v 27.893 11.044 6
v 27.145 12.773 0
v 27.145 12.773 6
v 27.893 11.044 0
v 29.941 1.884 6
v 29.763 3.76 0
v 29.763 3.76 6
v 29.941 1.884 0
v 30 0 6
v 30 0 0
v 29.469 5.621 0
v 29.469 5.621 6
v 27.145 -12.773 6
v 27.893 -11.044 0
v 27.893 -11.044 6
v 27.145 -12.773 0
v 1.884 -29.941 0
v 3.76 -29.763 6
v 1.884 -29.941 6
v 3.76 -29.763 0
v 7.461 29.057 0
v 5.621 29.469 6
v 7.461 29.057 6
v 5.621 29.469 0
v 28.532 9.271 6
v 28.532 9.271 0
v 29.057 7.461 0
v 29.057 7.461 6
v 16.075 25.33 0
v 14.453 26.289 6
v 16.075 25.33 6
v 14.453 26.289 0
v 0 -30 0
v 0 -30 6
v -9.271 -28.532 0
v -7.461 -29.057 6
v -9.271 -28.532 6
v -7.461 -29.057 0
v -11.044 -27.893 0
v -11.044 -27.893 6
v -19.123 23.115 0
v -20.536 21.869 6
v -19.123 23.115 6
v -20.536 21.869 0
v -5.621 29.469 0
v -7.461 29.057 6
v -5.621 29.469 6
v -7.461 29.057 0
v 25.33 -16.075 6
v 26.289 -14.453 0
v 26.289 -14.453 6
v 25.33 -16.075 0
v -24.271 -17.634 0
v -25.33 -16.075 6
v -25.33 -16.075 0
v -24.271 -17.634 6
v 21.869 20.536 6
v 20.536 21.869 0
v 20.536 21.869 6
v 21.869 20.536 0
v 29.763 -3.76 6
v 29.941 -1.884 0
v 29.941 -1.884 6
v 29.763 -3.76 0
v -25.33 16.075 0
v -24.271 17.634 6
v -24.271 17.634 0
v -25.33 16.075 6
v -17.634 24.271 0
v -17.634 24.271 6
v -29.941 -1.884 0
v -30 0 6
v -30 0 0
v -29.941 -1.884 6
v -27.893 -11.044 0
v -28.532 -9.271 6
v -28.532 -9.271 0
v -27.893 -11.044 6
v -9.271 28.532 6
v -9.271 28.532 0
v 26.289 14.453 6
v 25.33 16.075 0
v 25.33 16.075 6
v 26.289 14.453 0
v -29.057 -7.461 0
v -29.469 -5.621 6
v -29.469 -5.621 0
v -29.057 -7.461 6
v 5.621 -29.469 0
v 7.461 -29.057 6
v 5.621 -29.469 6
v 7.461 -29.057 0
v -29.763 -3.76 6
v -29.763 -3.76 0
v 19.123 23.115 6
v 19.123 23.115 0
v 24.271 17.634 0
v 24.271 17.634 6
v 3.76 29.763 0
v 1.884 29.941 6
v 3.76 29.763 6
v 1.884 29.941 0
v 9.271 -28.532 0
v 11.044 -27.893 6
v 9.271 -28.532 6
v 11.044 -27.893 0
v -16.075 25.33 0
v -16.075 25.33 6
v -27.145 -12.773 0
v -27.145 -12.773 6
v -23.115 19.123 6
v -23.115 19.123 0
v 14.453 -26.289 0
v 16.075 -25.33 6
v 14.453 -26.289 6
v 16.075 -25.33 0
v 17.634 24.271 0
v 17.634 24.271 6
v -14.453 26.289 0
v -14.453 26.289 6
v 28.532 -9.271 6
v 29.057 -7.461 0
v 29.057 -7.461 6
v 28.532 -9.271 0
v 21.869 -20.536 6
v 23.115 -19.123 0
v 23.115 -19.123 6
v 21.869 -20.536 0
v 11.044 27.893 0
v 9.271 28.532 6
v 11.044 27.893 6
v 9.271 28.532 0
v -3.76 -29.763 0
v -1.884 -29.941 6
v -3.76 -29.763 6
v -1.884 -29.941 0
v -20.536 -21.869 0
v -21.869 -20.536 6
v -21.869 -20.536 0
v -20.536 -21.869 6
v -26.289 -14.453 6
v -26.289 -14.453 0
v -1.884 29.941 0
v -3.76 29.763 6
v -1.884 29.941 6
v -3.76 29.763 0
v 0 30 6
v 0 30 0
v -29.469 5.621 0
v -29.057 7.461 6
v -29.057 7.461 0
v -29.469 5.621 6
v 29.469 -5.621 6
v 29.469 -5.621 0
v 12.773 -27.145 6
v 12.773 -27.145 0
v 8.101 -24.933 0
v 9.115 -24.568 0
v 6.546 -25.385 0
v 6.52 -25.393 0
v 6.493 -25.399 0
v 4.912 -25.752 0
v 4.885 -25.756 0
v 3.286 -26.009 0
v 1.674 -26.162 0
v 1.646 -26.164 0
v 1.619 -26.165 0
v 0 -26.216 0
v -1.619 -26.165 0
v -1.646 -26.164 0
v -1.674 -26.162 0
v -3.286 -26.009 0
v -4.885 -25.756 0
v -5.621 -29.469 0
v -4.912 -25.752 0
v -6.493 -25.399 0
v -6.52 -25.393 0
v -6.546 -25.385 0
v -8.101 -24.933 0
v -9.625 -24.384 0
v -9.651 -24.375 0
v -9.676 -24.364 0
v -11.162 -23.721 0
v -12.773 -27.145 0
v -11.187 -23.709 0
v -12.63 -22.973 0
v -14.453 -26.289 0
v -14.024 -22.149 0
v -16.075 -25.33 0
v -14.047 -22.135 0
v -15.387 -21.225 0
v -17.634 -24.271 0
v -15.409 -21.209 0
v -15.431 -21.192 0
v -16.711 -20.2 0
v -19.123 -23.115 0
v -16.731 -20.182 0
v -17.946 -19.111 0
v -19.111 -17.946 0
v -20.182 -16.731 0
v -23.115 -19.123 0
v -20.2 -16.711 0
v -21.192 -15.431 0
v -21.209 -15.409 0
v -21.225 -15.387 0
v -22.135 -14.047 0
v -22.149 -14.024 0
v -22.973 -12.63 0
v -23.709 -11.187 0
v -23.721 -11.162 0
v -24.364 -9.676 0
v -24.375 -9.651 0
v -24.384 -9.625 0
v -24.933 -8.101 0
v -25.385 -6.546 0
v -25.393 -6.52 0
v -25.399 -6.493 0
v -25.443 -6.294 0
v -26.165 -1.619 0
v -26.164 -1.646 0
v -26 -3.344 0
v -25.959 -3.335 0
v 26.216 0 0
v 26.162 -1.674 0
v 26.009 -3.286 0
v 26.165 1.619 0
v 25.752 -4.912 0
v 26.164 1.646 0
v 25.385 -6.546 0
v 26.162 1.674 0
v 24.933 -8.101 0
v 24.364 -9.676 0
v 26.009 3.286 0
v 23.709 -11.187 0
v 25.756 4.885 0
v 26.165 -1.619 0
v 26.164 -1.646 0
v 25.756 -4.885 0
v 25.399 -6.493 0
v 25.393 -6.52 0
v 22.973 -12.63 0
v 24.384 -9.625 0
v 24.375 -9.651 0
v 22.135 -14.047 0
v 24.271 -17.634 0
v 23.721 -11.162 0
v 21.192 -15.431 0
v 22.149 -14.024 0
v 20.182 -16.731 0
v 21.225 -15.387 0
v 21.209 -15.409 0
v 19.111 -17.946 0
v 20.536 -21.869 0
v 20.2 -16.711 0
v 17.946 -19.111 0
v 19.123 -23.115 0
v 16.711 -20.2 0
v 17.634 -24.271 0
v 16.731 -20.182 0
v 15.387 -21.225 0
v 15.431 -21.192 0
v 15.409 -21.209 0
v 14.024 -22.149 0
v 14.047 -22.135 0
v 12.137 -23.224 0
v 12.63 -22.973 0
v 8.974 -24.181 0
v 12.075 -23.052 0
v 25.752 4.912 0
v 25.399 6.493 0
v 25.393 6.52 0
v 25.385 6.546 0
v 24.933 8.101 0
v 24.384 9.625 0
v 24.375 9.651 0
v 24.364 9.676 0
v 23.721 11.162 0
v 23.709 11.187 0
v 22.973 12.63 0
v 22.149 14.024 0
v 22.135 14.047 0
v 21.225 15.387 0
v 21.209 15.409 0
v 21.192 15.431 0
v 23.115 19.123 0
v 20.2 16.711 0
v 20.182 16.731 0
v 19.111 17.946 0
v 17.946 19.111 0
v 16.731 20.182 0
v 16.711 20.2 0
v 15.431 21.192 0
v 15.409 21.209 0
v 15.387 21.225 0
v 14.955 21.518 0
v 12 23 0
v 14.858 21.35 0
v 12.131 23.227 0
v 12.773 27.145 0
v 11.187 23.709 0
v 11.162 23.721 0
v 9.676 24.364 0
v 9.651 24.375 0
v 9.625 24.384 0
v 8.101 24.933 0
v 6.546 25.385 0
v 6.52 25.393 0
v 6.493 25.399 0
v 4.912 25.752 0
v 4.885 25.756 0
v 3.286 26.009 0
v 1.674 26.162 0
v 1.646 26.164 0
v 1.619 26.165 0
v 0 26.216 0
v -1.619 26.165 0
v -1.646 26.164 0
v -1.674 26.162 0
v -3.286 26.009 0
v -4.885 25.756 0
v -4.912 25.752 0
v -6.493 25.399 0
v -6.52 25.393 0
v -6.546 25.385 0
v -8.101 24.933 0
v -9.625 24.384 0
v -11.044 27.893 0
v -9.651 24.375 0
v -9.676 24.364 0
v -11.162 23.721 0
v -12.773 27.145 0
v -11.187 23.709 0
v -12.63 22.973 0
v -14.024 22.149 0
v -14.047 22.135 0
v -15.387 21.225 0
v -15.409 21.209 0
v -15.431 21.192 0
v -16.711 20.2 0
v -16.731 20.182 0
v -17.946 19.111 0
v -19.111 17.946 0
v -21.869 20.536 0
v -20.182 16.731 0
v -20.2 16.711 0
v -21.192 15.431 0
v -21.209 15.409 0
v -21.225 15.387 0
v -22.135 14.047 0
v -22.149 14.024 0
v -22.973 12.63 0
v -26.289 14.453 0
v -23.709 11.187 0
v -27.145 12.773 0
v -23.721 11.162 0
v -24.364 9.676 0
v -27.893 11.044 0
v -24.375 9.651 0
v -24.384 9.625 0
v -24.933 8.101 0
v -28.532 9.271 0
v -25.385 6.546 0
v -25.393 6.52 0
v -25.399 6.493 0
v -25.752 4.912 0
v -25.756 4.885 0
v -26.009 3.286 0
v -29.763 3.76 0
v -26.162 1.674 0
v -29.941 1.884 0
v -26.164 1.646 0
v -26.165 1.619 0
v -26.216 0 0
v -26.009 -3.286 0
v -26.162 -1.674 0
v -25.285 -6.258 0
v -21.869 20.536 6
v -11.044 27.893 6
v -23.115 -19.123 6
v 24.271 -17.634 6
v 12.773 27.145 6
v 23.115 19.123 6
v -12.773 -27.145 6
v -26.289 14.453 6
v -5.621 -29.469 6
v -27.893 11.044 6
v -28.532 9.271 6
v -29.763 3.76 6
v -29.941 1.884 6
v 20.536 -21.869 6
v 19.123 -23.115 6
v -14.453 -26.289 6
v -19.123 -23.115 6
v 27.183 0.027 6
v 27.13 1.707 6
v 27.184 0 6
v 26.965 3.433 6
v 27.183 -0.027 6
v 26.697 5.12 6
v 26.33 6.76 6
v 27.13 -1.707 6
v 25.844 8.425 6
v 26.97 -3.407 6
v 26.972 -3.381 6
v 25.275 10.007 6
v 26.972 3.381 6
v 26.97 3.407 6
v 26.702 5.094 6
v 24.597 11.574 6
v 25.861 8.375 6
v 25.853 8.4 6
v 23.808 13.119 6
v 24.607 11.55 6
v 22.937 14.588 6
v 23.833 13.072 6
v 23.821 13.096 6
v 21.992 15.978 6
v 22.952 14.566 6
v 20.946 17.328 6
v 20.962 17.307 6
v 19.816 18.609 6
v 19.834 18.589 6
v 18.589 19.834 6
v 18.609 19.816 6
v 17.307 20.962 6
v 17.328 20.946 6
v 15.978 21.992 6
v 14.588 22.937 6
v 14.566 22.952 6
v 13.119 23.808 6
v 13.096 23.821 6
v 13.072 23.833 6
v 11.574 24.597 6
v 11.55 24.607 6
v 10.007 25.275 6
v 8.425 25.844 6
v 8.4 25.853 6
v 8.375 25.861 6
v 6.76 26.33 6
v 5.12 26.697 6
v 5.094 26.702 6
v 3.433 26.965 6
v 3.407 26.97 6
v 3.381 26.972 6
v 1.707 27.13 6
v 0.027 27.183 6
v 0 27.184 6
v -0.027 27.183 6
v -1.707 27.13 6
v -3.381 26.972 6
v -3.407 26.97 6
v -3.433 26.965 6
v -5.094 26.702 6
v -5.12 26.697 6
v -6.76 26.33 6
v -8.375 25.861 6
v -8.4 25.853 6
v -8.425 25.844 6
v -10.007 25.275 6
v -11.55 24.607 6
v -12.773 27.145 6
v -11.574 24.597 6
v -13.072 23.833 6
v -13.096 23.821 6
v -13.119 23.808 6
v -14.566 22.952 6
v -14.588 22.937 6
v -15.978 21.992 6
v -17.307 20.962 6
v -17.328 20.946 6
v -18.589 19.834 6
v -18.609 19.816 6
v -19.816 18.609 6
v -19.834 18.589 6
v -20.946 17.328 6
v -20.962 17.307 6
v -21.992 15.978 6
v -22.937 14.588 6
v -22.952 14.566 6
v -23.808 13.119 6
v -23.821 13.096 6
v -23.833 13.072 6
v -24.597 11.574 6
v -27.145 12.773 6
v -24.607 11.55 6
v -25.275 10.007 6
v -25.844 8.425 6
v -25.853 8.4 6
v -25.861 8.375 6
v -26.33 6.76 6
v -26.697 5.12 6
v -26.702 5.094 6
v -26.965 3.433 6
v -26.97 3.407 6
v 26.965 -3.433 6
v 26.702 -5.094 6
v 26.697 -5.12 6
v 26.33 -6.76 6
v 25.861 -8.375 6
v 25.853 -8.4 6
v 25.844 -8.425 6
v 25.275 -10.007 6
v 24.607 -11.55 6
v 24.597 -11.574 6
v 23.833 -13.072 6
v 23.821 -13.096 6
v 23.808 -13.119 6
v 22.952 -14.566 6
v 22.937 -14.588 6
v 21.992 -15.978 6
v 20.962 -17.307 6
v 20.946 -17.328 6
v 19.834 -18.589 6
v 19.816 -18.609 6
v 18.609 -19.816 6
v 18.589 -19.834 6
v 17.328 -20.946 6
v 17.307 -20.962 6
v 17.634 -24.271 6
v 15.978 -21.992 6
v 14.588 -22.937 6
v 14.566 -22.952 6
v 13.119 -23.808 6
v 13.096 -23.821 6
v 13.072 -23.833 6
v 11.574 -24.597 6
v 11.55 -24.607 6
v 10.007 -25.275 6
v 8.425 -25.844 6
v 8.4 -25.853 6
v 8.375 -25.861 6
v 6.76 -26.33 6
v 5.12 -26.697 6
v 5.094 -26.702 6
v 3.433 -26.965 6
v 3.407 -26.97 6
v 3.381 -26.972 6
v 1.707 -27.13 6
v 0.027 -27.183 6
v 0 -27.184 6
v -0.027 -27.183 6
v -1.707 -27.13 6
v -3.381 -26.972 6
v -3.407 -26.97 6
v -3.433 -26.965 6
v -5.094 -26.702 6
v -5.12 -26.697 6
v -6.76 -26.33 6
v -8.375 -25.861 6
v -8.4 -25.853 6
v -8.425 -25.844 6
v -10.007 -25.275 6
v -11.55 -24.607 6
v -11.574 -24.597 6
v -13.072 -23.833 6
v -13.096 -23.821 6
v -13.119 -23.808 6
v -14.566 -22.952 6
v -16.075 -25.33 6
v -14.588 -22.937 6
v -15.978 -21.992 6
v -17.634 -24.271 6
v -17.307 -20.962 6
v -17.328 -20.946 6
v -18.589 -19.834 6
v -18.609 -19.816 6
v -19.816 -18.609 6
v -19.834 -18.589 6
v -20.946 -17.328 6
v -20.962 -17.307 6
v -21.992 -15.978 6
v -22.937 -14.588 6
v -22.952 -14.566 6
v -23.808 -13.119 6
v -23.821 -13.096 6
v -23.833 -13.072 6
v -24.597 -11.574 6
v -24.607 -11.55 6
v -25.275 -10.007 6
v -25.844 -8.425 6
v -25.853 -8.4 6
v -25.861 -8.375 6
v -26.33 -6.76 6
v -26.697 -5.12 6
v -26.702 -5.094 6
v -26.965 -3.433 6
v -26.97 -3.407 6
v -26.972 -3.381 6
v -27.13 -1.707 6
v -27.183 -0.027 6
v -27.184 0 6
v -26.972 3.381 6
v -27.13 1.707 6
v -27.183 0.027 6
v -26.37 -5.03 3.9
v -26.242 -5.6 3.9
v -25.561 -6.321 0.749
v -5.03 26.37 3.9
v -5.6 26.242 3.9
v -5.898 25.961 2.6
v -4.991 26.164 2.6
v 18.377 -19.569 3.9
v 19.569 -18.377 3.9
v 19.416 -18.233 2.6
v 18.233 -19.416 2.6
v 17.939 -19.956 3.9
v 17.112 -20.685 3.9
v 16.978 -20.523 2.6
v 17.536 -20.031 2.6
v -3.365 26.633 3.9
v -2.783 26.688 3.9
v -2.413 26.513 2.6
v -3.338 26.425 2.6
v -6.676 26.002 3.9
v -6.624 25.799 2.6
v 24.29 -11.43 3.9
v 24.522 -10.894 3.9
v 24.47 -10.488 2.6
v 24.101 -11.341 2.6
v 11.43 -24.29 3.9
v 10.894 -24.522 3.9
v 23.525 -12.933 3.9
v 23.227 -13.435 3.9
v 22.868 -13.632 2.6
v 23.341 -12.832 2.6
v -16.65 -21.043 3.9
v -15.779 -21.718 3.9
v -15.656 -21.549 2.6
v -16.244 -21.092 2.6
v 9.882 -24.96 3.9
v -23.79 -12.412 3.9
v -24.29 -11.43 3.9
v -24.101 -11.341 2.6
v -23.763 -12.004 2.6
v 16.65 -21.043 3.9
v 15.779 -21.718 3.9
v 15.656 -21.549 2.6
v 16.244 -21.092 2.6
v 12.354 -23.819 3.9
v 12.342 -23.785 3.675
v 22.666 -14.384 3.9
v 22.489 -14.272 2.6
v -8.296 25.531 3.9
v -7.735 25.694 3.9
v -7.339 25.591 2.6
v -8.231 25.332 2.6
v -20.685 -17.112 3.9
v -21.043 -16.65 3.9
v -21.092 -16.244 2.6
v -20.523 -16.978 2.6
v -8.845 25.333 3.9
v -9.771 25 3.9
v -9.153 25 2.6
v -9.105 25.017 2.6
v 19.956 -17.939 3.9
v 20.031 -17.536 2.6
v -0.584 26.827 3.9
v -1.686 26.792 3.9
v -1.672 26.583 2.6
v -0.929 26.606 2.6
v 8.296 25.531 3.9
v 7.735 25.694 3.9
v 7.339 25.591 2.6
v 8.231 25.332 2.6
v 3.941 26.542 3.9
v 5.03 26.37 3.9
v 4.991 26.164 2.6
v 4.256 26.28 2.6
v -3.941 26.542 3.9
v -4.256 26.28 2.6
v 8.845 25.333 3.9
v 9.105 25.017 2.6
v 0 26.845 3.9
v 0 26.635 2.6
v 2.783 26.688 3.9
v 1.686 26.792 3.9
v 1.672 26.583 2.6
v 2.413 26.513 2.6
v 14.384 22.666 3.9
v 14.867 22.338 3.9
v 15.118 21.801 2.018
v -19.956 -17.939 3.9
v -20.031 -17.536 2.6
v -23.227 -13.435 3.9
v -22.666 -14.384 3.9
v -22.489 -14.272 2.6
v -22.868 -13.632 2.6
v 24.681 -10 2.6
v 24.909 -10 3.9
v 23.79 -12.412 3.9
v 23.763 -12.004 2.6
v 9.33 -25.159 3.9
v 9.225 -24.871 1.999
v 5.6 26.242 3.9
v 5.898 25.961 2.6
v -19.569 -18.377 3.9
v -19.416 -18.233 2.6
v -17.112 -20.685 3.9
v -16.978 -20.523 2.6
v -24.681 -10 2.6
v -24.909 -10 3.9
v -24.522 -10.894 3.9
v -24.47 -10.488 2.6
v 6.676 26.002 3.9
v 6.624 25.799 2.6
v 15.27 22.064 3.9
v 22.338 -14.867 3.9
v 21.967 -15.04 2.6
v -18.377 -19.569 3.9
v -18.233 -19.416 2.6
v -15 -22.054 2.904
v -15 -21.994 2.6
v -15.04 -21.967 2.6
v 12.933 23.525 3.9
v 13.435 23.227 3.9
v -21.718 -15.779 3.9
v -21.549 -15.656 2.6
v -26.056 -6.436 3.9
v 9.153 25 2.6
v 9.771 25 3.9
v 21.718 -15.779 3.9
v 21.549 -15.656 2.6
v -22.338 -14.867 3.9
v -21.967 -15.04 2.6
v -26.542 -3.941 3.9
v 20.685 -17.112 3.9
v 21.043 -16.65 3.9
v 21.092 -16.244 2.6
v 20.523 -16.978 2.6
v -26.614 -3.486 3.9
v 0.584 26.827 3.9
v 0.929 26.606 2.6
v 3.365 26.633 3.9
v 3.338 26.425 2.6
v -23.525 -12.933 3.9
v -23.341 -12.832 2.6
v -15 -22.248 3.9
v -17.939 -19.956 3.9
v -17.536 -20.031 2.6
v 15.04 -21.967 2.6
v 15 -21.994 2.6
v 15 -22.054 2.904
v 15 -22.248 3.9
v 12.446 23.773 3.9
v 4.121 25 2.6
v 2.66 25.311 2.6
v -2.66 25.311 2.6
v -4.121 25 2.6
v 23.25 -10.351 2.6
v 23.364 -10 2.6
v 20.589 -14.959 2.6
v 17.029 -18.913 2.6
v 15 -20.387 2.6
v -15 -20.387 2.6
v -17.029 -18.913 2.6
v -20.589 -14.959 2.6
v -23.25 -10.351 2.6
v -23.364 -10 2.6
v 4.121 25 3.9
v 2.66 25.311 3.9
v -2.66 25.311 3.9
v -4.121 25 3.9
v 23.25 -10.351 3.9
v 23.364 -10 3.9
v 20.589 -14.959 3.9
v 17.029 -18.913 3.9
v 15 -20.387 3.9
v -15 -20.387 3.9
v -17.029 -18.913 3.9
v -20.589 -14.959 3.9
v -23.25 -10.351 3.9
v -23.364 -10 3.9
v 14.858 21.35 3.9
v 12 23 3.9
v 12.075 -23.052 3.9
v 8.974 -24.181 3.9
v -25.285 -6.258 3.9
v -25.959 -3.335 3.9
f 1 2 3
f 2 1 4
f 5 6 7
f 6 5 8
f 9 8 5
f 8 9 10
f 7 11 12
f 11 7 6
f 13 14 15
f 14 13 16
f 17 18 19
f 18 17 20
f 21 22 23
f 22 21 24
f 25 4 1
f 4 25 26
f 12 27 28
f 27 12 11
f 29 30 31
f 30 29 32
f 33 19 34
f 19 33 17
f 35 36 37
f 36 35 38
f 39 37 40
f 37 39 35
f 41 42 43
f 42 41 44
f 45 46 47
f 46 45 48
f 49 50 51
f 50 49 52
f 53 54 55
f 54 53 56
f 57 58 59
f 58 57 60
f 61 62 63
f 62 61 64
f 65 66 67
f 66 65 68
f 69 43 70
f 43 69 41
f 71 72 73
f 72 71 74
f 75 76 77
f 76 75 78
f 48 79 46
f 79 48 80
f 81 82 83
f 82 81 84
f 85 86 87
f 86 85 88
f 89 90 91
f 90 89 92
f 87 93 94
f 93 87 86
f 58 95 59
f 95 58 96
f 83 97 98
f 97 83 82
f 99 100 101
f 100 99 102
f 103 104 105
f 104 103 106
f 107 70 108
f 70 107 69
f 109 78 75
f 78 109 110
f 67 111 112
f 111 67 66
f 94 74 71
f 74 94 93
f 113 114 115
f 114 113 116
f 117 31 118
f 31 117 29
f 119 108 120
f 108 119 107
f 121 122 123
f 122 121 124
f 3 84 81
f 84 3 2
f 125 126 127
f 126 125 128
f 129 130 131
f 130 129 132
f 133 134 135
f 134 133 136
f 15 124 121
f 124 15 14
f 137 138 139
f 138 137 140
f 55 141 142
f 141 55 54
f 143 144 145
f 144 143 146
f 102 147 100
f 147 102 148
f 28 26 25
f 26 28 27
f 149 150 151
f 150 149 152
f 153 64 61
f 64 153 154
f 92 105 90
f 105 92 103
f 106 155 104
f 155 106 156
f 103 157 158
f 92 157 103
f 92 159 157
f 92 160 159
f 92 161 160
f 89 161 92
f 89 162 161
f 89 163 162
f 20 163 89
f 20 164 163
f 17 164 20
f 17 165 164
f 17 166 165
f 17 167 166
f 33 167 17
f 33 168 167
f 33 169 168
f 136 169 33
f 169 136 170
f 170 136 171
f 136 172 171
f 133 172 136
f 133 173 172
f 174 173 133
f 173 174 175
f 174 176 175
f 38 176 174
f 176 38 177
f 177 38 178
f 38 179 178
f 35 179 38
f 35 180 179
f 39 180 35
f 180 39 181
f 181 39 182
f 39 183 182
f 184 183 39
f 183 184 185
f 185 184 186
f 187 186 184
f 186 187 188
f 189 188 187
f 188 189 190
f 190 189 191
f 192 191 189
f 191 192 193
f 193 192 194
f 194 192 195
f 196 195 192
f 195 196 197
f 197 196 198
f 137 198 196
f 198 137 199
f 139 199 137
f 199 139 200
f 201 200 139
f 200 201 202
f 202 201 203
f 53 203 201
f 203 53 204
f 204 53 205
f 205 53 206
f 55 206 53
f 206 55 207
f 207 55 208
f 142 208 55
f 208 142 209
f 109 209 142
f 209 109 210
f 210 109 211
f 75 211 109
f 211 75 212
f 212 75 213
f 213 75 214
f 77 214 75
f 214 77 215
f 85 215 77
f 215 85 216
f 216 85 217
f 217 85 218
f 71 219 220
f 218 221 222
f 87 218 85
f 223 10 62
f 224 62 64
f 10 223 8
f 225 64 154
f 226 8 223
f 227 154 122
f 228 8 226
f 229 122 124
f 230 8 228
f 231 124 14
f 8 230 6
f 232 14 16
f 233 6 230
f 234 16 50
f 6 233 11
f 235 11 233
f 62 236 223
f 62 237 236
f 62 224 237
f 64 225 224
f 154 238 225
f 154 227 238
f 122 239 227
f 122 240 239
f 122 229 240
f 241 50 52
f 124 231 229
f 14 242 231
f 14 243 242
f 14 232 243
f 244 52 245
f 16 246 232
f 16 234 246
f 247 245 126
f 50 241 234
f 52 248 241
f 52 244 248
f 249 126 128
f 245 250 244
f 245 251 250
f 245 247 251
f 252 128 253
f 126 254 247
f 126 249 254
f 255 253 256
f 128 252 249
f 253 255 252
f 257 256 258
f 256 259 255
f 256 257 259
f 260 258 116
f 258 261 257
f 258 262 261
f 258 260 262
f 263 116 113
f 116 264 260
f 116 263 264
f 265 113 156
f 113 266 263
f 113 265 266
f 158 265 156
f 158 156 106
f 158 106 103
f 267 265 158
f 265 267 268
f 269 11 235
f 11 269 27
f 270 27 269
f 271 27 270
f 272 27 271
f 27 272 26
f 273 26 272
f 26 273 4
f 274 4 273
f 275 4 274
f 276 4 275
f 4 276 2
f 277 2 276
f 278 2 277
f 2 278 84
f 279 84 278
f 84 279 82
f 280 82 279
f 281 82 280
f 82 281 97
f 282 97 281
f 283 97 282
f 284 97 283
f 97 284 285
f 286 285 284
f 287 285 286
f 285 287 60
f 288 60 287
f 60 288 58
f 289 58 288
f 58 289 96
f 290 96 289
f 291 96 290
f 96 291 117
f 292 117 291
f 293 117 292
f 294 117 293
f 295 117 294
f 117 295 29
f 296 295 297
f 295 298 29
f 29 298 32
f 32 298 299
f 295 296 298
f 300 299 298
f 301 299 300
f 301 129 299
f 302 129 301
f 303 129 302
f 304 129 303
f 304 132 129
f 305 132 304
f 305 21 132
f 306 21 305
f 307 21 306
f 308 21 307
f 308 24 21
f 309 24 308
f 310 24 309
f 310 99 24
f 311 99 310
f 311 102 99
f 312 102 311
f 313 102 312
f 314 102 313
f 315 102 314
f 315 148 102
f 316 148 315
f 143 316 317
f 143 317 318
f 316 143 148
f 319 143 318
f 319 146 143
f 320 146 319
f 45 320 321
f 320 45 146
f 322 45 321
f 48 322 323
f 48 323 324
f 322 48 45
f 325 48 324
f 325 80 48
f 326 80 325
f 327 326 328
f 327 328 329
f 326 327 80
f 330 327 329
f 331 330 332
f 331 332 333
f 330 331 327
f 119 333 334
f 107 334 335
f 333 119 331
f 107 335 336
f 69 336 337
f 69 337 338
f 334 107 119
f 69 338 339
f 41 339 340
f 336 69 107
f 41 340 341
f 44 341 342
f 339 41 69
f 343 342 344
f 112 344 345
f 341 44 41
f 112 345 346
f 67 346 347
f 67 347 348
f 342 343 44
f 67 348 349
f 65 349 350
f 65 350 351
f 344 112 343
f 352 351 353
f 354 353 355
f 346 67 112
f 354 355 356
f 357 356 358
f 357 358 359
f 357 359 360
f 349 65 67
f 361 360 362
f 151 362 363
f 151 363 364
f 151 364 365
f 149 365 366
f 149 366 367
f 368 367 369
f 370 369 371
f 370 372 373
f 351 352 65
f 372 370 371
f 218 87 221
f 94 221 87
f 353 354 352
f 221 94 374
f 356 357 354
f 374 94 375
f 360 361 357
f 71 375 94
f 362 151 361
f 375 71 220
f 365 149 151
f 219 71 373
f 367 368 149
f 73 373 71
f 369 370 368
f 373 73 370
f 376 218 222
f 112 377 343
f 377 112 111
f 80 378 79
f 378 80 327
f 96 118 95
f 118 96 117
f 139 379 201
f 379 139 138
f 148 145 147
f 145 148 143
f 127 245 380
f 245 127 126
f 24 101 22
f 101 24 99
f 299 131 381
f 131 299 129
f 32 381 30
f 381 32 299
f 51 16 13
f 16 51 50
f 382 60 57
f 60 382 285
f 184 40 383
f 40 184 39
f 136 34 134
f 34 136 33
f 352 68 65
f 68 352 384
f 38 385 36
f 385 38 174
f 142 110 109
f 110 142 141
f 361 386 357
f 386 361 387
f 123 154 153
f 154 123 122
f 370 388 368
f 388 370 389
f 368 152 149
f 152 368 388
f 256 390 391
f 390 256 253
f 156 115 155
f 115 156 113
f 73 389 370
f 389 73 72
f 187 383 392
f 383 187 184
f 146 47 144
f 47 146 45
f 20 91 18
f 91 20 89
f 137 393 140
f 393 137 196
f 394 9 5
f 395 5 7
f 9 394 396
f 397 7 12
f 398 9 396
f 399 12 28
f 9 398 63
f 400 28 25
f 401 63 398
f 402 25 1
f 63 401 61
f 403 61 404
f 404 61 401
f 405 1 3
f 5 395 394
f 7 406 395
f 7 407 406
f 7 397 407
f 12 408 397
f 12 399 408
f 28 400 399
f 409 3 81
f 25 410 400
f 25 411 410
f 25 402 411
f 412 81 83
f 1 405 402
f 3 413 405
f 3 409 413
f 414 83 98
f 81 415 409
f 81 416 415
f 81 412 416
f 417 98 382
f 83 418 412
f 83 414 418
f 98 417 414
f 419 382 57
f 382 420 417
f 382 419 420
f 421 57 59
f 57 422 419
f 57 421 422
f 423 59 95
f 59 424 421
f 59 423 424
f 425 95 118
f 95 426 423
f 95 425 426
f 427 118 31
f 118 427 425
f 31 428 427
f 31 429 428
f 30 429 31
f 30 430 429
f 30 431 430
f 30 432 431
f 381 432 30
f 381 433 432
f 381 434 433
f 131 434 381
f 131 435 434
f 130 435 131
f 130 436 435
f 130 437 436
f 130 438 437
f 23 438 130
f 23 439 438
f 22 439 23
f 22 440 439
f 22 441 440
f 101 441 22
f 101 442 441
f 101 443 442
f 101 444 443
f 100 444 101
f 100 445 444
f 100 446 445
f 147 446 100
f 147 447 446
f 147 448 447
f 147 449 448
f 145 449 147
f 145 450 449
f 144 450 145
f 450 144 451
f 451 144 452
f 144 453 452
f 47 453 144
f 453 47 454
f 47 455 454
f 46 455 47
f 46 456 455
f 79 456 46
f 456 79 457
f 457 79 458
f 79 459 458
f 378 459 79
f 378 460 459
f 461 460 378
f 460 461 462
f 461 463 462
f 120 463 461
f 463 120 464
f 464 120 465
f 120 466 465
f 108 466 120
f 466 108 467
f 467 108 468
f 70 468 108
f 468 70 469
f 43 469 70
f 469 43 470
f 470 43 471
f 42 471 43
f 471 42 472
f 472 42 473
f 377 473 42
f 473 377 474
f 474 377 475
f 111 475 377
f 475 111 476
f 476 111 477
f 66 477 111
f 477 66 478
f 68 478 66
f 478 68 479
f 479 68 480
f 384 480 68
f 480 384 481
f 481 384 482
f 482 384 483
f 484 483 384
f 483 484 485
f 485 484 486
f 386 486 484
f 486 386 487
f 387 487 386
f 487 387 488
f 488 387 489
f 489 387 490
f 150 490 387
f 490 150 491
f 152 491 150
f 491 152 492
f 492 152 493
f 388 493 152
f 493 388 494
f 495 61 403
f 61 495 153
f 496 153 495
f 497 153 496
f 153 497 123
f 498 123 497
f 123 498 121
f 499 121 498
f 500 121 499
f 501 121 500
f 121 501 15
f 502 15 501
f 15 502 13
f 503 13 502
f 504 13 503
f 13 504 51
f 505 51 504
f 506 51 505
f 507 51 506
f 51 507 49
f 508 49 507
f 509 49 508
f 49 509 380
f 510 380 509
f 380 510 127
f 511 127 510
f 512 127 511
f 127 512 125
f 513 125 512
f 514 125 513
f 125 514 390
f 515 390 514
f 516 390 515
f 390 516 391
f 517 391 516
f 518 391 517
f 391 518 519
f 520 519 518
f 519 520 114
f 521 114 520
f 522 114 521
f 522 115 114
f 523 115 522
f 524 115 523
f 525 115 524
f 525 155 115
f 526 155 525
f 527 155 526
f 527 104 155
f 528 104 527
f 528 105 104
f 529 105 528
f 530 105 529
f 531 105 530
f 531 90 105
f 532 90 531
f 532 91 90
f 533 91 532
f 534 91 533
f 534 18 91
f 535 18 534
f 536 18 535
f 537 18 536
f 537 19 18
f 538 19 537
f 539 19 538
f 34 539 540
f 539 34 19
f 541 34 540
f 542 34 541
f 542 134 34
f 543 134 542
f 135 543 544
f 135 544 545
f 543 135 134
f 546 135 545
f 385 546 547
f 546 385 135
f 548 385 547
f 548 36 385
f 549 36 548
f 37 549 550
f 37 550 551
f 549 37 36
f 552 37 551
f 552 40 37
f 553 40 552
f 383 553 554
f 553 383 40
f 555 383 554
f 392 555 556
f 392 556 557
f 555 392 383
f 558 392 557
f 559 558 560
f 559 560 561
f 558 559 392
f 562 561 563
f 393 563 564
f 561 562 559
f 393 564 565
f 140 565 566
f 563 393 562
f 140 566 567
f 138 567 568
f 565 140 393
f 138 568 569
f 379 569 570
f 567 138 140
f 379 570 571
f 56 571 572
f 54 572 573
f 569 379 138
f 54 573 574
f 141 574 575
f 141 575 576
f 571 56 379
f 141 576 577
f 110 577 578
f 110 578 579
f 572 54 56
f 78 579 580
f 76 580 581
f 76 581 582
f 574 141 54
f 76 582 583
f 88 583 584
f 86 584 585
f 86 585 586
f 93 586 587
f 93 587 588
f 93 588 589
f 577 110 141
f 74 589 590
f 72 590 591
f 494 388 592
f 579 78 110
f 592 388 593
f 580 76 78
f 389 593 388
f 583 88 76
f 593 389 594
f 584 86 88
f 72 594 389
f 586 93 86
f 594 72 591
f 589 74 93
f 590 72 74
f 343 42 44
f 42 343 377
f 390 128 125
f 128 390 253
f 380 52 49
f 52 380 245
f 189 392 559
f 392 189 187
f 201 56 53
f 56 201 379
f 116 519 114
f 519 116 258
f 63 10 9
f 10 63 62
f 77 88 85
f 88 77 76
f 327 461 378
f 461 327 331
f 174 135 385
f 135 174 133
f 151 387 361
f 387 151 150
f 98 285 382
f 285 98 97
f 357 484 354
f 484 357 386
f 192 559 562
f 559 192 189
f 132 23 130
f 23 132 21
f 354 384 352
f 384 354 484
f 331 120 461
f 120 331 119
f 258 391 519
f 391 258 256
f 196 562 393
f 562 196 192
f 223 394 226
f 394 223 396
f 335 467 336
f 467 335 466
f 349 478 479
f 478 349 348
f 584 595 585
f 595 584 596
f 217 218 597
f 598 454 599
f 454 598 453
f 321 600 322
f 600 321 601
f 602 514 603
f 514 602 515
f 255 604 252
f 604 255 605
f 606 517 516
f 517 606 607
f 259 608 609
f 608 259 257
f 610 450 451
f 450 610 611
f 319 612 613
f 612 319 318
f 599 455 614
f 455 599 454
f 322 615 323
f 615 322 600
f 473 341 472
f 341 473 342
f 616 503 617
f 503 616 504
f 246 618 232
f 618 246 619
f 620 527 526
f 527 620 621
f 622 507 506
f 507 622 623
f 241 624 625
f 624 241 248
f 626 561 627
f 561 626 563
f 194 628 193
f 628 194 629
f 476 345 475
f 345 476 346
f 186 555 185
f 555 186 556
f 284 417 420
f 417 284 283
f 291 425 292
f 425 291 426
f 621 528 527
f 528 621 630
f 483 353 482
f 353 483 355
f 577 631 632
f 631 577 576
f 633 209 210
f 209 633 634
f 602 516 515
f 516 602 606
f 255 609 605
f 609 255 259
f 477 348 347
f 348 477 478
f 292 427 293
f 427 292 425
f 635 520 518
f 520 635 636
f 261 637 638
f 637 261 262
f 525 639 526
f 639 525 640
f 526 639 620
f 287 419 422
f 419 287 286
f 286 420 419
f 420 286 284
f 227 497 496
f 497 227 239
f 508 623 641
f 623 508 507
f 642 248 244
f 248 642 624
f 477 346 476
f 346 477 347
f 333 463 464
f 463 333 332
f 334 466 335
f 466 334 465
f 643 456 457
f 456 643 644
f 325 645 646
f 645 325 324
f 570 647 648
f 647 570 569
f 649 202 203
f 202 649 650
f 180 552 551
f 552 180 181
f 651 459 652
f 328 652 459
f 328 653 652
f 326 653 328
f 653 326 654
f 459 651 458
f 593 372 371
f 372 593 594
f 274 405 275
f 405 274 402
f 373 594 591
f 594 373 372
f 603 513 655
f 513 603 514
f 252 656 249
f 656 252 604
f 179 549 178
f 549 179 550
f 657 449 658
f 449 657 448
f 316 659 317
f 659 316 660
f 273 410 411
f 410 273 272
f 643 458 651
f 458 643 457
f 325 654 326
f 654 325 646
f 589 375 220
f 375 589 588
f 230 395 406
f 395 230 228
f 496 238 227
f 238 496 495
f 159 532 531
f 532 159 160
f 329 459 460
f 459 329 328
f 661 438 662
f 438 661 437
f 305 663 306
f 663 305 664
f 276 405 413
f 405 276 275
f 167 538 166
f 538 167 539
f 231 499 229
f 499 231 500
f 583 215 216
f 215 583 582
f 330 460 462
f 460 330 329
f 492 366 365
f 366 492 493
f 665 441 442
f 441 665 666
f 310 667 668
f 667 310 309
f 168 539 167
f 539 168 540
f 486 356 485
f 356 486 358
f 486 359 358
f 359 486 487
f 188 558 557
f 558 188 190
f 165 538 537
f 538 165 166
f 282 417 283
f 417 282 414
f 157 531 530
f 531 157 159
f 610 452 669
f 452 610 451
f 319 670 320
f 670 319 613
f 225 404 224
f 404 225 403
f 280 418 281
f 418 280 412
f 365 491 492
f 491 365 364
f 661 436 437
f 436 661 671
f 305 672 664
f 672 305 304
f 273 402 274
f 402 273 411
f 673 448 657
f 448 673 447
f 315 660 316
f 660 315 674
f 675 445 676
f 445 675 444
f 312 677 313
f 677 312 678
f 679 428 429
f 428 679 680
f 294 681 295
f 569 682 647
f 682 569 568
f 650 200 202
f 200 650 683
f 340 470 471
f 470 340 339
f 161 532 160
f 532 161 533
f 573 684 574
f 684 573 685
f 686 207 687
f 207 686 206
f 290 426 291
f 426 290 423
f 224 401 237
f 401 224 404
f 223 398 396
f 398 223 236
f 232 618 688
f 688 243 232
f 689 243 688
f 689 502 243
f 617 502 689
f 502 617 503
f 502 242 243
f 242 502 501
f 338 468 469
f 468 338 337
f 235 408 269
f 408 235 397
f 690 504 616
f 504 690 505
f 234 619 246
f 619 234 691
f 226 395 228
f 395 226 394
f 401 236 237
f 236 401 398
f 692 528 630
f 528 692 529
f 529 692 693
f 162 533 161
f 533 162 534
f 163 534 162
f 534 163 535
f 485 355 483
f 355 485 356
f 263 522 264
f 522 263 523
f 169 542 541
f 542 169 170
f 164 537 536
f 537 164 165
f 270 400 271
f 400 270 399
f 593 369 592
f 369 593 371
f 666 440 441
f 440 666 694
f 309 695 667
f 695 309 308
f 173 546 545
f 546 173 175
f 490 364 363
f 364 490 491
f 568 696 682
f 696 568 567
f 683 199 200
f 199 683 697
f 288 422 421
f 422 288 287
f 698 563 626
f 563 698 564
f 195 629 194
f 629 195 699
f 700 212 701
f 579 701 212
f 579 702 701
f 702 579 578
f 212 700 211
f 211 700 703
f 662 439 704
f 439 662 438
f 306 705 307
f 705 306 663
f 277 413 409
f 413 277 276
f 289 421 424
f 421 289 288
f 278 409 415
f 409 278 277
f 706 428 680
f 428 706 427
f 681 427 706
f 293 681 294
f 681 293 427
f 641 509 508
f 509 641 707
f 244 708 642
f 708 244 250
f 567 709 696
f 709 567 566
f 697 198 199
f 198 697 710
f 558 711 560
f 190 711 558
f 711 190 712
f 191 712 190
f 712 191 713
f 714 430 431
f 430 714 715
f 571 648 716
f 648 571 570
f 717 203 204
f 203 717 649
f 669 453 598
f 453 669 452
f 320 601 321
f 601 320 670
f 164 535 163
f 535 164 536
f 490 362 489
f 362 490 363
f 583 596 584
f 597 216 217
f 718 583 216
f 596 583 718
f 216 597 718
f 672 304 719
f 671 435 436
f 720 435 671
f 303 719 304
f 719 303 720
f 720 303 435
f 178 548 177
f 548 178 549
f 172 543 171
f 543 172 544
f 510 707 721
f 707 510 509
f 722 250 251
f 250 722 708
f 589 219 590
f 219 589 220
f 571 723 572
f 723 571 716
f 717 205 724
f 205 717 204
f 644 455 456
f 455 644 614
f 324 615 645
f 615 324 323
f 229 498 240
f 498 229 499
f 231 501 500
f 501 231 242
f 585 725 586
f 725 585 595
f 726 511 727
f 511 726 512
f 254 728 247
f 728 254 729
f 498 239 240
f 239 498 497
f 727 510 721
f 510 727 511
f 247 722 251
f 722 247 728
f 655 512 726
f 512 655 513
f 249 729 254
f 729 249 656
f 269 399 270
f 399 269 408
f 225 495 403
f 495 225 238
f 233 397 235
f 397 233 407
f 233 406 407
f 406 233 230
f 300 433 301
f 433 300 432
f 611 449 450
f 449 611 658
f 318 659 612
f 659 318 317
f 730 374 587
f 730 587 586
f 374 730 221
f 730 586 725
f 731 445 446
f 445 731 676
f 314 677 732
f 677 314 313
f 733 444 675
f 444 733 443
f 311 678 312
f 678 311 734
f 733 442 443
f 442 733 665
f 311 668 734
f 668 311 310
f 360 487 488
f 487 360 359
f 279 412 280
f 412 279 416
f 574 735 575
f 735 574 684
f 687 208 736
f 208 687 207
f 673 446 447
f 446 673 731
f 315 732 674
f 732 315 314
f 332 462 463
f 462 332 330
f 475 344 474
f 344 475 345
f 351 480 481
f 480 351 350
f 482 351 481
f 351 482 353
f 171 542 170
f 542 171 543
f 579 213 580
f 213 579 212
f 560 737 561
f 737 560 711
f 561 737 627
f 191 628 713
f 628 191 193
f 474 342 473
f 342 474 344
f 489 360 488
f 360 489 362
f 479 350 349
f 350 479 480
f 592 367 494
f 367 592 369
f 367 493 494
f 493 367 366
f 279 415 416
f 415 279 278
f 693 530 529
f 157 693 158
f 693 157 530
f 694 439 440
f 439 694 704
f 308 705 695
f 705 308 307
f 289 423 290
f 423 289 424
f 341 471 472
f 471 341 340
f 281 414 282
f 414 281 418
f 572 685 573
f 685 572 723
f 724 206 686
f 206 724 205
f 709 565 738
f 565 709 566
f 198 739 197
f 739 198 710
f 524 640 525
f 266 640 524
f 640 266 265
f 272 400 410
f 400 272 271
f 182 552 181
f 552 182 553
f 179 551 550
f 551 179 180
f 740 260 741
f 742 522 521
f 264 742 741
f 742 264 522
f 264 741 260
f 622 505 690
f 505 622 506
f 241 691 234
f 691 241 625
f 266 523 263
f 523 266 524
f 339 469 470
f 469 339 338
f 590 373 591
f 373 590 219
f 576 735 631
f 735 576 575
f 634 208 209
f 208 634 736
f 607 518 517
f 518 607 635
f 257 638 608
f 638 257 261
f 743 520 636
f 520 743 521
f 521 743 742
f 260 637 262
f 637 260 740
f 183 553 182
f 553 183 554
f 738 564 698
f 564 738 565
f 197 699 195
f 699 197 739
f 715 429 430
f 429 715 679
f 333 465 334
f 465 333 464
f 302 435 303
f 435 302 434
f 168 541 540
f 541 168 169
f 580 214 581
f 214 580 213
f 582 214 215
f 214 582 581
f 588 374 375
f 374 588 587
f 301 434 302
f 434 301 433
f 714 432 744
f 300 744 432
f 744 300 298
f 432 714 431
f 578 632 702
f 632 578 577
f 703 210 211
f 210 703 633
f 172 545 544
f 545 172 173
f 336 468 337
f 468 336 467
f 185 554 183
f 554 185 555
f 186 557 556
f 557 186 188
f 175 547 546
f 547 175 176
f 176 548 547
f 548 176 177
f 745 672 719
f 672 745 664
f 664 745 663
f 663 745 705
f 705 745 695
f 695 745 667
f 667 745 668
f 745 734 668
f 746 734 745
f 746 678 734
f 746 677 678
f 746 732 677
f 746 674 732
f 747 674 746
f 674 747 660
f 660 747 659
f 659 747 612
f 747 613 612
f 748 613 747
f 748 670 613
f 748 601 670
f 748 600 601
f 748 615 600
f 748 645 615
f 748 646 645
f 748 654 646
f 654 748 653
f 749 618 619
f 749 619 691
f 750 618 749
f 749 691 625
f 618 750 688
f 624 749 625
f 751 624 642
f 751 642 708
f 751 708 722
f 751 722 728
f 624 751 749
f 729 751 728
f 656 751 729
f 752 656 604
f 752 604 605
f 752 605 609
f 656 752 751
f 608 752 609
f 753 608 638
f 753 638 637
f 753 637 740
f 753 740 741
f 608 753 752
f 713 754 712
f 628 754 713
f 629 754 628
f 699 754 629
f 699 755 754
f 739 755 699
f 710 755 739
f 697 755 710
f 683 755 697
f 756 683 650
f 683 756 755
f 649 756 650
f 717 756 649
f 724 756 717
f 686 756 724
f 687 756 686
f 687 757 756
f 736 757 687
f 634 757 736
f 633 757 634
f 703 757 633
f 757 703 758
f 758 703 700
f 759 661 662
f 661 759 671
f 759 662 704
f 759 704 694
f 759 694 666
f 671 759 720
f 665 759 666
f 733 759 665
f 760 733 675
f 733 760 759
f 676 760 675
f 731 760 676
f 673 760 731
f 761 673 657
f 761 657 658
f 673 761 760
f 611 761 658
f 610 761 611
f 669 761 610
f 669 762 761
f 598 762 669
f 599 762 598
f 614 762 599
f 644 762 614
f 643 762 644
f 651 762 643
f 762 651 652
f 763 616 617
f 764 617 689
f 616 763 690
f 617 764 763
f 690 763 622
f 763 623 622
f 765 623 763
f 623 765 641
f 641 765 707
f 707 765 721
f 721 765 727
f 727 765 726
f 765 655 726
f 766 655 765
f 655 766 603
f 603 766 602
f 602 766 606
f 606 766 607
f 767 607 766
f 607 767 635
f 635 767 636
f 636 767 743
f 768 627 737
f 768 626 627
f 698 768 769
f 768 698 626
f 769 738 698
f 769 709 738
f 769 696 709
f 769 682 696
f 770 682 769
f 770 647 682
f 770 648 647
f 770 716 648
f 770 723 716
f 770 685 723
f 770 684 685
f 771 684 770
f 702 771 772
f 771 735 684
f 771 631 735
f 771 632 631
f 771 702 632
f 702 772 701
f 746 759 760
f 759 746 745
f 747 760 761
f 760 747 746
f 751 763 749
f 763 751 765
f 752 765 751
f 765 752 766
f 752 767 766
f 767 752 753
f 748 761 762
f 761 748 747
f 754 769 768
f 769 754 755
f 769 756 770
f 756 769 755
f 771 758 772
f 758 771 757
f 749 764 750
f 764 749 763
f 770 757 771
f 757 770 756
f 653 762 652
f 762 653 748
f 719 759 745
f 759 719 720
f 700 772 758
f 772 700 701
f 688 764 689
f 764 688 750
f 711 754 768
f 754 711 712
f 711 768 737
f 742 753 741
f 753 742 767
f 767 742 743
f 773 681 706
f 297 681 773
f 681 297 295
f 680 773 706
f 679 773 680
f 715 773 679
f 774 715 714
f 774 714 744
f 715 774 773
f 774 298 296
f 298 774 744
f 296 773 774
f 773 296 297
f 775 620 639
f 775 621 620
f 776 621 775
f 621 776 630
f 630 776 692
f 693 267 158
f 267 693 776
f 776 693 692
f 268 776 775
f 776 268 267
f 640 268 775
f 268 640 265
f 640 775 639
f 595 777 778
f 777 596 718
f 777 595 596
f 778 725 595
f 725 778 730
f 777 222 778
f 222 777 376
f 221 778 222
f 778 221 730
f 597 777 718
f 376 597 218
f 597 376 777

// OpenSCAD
// file: ../../library.scad
module tubo(
	h/*Altura*/,
	w/*Pared*/,
	d/*Diametro*/
){
  difference()
  {
    cylinder(r=(d/2), h);
    translate([0,0,-0.1])
    cylinder(r=(d/2)-(2*w), h+0.2);
  }
}

module huyoMasPared(
	d/*Diametro del hoyo*/,
	w/*Pared*/,
	h/*Altura*/,
){
  difference()
  {
    cylinder(r=((d+(2*w))/2), h);
    translate([0,0,-0.1])
    cylinder(r=(d/2), h+0.2);
  }
}

module cuboMasPared(
    w1, //Largo
    w2, //Ancho
    p1, //Pared
    p2, //Pared
    h   //Alto
)
{    
    difference()
    {
        translate([-(w1+(p1*2))/2,-(w2+(p2*2))/2,0])
        cube([(w1+(p1*2)),(w2+(p2*2)),h]);
        
        translate([-w1/2,-w2/2,-0.2])
        cube([w1,w2,h*2]);
        
    }
    
    
}

soporteW = 0.7;

module soporteCylinder()
{
  difference()
  {
	cylinder(r=radio,altura);

	translate([0,0,-0.1])
	cylinder(r=radio-soporteW,altura+0.2);
  }

  if(true){
  difference()
  {
	cylinder(r=radio+0.75,1);

	translate([0,0,-0.1])
	cylinder(r=radio-0.75,1.25);
  }}

}

module soporteOval()
{
  difference()
  {
	oval(w=ancho, h=largo, height=alto, center = false);

	translate([0,0,-0.1])
	oval(ancho-soporteW, largo, alto+0.2);
  }

  difference()
  {
	oval(w=ancho+1, h=largo+1, height=1, center = false);

	translate([0,0,-0.1])
	oval(w=ancho-1, h=largo-1, height=1.25, center = false);
  }

}


module oval(w,h, height, center = false)
{
  scale([1, h/w, 1]) cylinder(h=height, r=w, center=center);
}
// file: Diffracter.scad
//include <Tapa.scad>
include <../../library.scad>


bigW = 88;
ori = bigW/2;
raspSellR = 59;
tuboH = 140;
H = 18.5 + 9;
selloH = 7;
tornR = 2;

huecoPared = 12;
huecoH = 22;
selloHembraRadio=40;

//Activate this to display
if(0)
{
//translate([0,0,bigW/2])
//rotate([0,90,0])
diffracter();


//soporteCylinder(radio=25.2,altura=3.8);

}


module diffracter(){	

difference(){

//Bloque
translate([-bigW/2,-bigW/2,0])
cube([bigW,bigW,H]);

/*
translate([
						-(bigW-huecoPared)/2,
						-(bigW-huecoPared)/2,
						(huecoH/2)
					])
		cube([
					bigW-huecoPared,
					bigW-huecoPared,
					H-huecoH]
				);*/


//Diffractador
translate([-37.25,-40,-0.1])
cube([74.5,80,5.6]);

//Macro
translate([0,0,5.4])
cylinder(r=(74.5/2),8.2,$fn=100);

//Sello de raspberry
//translate([0,0,-0.1])
//cylinder(r=(raspSellR/2)+1,2);

//Tubo
//translate([0,0,-0.1])
//cylinder(r=(52/2),200);

//Tornillos abajo
translate([-ori+4,-ori+4,-0.1])
cylinder(r=tornR,20);
translate([ori-4,-ori+4,-0.1])
cylinder(r=tornR,20);
translate([-ori+4,ori-4,-0.1])
cylinder(r=tornR,20);
translate([ori-4,ori-4,-0.1])
cylinder(r=tornR,20);

//Hueco
cylinder(r=36,H+1);

//Tornillos caja
translate([0,0,(tuboH/2)-7])
rotate([0,90,0])
tornillosArriba();

//Tornillo tripie
translate([-ori-0.1,0,(tuboH/2)+7])
rotate([0,90,0])
cylinder(r=5/2,5.31);

//Sello hembra
//translate([0,0,H-3])
//cylinder(r=selloHembraRadio,4);

}

//Sello cobertura
//translate([0,0,H-1])
//huyoMasPared(58,3,3);


}
// main file
include <Diffracter.scad>
//include <navaja.scad>

cannonDiam1 = 52.4;
cannonDiam2 = 54.4;
cannonPared = 3;
cannonNavBase = 3;
cannonH = 6;//14-cann..

if( 1 )
{
    allRosca();
}

module allRosca()
{
    
    roscaHembraCannon();



}

module roscaHembraCannon()
{
    
    //creaOrejas();
    
difference()
{

cylinder(r=30,cannonH, $fn=100);
//cylinder( r1=(cannonDiam1+(cannonPared*2))/2, r2=(cannonDiam2+(cannonPared*2))/2, cannonH, $fn=100 );
translate([0,0,-0.1])
cylinder( r1=(cannonDiam1/2), r2=cannonDiam2/2, cannonH+0.2, $fn=100 );
   
}

translate([0,0,cannonH-3.4])
difference()
{
    cylinder( r=(cannonDiam1+7)/2, 1.3  );
    
    translate([0,0,-0.1])
    cylinder( r=(cannonDiam1-1.5)/2, 2  );
    
    rotate([0,0,0])
    translate([-35,-10,-2])
    cube( [70,35,5] );

    rotate([0,0,90])
    translate([-70,-15,-2])
    cube( [70,30,5] );
}


translate([12,23,0])
rotate([0,0,-30])
cube([3.3,3,cannonH-3.4+1.3]);

translate([10,-27,0])
rotate([0,0,20])
cube([3.3,3,cannonH-3.4+1.3]);

translate([-28.5,-7,0])
rotate([0,0,13])
cube([3.3,3,cannonH-3.4+1.3]);





}







module creaOrejas()
{
    translate([0,36,0])
    cylinder(r=8,9,$fn=100);

    translate([31,-18,0])
    cylinder(r=8,9,$fn=100);

    translate([-31,-18,0])
    cylinder(r=8,9,$fn=100);
}

//creaNavajas();

module tornTriang()
{
    translate([-32,-18,-0.1])
    cylinder(r=3,10,$fn=20);
    
    translate([32,-18,-0.1])
    cylinder(r=3,10,$fn=20);
    
    translate([0,36,-0.1])
    cylinder(r=3,10,$fn=20);
    
}
